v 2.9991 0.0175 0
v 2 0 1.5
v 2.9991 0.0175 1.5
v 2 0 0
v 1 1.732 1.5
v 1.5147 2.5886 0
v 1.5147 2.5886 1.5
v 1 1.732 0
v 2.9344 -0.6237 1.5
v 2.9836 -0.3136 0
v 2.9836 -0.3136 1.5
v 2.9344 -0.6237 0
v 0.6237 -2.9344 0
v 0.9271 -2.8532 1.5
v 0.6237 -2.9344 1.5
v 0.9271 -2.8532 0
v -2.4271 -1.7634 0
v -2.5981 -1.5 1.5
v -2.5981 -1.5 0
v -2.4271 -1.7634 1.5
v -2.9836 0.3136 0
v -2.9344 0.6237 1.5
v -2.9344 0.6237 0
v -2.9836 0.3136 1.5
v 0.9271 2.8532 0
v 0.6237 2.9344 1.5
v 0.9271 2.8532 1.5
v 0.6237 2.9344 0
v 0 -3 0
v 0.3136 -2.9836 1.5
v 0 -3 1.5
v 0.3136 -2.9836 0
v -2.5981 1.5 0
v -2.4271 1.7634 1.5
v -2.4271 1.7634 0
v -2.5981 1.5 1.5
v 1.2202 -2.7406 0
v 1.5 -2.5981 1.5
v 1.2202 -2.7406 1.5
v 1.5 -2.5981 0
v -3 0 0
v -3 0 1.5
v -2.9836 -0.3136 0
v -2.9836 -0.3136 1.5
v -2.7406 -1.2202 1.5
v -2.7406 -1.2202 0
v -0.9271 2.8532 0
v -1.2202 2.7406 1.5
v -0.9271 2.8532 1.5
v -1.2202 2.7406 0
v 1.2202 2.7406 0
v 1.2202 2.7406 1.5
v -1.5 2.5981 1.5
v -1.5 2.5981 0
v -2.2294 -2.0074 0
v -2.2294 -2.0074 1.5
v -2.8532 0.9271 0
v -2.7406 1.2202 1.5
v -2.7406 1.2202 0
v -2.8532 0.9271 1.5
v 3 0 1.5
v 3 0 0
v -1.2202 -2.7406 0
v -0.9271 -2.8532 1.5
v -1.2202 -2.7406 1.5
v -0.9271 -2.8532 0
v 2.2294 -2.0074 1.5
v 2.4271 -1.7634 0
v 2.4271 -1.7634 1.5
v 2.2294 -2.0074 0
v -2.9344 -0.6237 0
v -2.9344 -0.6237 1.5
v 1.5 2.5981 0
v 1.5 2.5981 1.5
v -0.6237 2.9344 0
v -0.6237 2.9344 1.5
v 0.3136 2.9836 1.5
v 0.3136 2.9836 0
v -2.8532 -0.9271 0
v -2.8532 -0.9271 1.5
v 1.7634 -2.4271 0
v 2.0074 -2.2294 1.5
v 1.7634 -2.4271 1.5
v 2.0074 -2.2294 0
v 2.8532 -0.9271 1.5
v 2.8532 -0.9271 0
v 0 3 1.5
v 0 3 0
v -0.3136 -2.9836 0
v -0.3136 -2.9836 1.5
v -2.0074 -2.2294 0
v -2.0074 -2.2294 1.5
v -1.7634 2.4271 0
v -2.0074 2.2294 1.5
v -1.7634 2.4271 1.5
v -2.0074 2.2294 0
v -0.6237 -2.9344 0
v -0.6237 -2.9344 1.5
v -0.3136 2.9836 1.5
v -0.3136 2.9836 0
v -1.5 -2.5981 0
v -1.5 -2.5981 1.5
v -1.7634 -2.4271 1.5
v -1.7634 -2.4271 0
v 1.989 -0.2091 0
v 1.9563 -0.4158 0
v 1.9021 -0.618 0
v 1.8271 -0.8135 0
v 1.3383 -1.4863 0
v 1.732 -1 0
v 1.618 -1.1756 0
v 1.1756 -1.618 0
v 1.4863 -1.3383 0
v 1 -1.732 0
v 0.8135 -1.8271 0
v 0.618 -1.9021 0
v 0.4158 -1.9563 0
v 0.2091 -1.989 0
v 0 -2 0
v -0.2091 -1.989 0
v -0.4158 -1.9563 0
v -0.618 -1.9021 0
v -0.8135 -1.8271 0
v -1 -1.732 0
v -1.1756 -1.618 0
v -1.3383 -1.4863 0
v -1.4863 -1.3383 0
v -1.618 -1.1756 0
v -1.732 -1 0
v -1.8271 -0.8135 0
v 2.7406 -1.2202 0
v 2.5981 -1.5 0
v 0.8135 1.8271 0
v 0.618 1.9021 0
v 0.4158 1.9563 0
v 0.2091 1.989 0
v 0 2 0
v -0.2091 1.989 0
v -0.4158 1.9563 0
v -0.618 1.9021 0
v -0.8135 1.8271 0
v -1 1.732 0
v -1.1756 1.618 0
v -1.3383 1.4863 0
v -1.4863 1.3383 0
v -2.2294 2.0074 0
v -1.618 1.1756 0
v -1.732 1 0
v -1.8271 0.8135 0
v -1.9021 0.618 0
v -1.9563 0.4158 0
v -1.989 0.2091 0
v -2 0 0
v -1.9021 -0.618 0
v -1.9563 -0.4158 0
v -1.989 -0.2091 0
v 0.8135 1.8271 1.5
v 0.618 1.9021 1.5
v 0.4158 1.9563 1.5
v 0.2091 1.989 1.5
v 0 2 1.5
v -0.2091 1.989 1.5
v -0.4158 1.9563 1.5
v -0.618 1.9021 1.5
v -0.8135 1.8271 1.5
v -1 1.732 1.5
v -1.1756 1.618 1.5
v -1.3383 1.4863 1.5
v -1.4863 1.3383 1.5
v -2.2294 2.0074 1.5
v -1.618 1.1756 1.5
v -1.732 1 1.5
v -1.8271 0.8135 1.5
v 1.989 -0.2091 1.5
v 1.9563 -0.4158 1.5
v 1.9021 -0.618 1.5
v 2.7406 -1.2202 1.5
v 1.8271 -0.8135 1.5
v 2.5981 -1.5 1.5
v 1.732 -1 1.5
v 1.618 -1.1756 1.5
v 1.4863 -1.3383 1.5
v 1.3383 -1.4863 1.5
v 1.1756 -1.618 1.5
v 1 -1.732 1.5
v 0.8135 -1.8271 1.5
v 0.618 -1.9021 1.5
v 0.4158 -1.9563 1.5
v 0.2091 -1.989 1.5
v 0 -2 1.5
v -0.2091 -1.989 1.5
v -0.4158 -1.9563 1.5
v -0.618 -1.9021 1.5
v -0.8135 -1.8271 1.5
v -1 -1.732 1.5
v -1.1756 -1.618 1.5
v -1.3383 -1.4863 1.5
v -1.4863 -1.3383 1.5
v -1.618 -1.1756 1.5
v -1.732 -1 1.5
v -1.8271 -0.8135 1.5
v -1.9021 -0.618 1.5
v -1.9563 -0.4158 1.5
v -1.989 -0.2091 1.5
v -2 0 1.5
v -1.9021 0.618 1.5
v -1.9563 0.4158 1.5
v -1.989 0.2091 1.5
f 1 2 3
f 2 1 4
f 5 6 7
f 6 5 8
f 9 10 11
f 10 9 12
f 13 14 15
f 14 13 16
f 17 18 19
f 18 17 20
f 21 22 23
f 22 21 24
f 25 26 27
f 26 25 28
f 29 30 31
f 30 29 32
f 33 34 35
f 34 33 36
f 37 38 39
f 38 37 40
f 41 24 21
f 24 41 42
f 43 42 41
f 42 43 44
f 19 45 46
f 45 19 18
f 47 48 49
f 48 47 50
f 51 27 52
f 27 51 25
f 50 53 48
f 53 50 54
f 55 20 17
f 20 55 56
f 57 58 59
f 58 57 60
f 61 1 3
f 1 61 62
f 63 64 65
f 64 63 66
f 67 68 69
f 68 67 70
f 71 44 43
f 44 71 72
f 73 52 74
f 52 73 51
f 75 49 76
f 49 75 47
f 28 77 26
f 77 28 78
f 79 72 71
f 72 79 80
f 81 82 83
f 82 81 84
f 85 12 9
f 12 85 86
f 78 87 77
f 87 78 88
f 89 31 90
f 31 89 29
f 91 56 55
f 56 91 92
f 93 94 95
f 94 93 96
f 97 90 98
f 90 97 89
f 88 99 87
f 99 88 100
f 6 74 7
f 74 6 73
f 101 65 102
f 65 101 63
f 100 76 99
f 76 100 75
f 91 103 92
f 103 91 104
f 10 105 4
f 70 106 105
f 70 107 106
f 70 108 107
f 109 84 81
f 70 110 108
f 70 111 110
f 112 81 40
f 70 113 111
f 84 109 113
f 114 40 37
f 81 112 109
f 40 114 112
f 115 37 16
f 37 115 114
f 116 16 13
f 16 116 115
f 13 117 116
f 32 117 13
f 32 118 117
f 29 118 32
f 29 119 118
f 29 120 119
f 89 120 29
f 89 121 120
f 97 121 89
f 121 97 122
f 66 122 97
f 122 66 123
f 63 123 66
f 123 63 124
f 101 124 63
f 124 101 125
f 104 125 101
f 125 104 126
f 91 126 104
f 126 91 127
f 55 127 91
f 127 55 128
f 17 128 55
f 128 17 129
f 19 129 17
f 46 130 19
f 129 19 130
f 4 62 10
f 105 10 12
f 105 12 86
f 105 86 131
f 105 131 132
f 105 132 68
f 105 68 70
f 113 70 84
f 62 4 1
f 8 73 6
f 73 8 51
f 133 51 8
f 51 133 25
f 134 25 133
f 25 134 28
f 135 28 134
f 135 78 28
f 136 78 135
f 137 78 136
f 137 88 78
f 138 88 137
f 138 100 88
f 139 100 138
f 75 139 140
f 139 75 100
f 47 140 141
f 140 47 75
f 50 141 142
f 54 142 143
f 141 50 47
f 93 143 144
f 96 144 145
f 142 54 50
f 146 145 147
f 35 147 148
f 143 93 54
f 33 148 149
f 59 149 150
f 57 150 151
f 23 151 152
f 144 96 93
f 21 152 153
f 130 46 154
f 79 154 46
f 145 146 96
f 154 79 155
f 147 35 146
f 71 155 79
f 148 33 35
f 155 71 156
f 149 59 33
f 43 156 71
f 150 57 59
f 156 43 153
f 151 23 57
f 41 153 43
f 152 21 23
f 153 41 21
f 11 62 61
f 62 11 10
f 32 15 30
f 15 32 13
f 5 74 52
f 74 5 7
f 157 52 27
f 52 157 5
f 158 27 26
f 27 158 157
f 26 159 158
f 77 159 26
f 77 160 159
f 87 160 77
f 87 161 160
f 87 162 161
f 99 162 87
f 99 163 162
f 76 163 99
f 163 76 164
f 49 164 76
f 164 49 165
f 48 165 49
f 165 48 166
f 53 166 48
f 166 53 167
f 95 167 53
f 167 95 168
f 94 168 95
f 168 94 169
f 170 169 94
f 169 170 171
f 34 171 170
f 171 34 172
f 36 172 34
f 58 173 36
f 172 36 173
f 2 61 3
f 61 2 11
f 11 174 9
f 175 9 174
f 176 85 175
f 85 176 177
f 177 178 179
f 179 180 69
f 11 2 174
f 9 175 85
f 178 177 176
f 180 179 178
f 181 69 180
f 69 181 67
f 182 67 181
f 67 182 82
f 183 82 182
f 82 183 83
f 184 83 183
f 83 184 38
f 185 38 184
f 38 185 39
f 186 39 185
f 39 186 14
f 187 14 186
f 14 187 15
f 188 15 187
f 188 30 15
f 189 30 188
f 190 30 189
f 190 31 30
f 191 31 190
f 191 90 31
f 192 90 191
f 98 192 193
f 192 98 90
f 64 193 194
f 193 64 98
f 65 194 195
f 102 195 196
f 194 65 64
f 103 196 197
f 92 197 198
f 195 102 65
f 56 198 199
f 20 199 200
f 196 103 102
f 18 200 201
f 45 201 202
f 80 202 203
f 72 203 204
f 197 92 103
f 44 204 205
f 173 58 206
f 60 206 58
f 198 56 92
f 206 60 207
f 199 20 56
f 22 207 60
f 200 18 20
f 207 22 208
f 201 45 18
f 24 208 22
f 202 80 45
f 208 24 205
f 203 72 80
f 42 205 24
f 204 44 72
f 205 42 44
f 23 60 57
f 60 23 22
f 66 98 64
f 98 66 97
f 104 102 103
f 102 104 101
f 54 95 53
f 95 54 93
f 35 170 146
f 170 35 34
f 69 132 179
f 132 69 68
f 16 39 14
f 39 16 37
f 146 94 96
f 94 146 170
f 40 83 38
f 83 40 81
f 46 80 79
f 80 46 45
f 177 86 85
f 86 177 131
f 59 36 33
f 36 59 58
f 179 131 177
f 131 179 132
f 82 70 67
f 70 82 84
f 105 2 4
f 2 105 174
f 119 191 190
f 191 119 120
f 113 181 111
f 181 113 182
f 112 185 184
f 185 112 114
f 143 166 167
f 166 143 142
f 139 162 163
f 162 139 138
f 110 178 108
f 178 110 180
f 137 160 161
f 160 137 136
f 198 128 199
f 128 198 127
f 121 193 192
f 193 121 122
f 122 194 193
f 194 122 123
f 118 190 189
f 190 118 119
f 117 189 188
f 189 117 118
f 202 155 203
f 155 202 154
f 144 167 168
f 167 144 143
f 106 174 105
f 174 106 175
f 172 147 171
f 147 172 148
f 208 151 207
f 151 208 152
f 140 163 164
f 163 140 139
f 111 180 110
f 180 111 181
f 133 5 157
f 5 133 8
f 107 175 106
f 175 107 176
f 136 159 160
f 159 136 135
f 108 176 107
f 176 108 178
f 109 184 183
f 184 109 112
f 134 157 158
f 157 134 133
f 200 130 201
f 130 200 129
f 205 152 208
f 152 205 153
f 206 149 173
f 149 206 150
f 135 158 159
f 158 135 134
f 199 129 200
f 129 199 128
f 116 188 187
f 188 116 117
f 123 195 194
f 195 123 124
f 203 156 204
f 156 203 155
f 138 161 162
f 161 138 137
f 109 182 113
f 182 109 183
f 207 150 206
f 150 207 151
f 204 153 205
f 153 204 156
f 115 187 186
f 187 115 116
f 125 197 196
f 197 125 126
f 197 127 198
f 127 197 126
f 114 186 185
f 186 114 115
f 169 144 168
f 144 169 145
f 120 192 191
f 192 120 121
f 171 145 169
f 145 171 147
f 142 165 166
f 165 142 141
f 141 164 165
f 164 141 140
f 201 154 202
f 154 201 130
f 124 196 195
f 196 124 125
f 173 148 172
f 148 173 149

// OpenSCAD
//Square Rod or Tubing Bracket
//Designed by Bryscus: Bryce B.

//Marker Height
MH=1.5;

//Cable Radius
CD=4;

//Wall thickness
WT=1;

//Opening (in degrees)
OD=60; //[10:160]

SLICE_SIZE=3.14*(CD)*2/360;

difference(){
	translate([0,0,MH/2])
		cylinder(h=MH, r=CD/2+WT,$fn=60,center=true); // screw hole
	translate([0,0,MH/2])
		cylinder(h=MH+1, r=CD/2,$fn=60,center=true); // screw hole
	for ( i = [1 : OD-1] )
	{
   	rotate(i, [0, 0, 1])
   	translate([(CD+1)/2, 0, (MH)/2])
   	cube([CD+1,SLICE_SIZE,MH+1], center=true);
	}
}
